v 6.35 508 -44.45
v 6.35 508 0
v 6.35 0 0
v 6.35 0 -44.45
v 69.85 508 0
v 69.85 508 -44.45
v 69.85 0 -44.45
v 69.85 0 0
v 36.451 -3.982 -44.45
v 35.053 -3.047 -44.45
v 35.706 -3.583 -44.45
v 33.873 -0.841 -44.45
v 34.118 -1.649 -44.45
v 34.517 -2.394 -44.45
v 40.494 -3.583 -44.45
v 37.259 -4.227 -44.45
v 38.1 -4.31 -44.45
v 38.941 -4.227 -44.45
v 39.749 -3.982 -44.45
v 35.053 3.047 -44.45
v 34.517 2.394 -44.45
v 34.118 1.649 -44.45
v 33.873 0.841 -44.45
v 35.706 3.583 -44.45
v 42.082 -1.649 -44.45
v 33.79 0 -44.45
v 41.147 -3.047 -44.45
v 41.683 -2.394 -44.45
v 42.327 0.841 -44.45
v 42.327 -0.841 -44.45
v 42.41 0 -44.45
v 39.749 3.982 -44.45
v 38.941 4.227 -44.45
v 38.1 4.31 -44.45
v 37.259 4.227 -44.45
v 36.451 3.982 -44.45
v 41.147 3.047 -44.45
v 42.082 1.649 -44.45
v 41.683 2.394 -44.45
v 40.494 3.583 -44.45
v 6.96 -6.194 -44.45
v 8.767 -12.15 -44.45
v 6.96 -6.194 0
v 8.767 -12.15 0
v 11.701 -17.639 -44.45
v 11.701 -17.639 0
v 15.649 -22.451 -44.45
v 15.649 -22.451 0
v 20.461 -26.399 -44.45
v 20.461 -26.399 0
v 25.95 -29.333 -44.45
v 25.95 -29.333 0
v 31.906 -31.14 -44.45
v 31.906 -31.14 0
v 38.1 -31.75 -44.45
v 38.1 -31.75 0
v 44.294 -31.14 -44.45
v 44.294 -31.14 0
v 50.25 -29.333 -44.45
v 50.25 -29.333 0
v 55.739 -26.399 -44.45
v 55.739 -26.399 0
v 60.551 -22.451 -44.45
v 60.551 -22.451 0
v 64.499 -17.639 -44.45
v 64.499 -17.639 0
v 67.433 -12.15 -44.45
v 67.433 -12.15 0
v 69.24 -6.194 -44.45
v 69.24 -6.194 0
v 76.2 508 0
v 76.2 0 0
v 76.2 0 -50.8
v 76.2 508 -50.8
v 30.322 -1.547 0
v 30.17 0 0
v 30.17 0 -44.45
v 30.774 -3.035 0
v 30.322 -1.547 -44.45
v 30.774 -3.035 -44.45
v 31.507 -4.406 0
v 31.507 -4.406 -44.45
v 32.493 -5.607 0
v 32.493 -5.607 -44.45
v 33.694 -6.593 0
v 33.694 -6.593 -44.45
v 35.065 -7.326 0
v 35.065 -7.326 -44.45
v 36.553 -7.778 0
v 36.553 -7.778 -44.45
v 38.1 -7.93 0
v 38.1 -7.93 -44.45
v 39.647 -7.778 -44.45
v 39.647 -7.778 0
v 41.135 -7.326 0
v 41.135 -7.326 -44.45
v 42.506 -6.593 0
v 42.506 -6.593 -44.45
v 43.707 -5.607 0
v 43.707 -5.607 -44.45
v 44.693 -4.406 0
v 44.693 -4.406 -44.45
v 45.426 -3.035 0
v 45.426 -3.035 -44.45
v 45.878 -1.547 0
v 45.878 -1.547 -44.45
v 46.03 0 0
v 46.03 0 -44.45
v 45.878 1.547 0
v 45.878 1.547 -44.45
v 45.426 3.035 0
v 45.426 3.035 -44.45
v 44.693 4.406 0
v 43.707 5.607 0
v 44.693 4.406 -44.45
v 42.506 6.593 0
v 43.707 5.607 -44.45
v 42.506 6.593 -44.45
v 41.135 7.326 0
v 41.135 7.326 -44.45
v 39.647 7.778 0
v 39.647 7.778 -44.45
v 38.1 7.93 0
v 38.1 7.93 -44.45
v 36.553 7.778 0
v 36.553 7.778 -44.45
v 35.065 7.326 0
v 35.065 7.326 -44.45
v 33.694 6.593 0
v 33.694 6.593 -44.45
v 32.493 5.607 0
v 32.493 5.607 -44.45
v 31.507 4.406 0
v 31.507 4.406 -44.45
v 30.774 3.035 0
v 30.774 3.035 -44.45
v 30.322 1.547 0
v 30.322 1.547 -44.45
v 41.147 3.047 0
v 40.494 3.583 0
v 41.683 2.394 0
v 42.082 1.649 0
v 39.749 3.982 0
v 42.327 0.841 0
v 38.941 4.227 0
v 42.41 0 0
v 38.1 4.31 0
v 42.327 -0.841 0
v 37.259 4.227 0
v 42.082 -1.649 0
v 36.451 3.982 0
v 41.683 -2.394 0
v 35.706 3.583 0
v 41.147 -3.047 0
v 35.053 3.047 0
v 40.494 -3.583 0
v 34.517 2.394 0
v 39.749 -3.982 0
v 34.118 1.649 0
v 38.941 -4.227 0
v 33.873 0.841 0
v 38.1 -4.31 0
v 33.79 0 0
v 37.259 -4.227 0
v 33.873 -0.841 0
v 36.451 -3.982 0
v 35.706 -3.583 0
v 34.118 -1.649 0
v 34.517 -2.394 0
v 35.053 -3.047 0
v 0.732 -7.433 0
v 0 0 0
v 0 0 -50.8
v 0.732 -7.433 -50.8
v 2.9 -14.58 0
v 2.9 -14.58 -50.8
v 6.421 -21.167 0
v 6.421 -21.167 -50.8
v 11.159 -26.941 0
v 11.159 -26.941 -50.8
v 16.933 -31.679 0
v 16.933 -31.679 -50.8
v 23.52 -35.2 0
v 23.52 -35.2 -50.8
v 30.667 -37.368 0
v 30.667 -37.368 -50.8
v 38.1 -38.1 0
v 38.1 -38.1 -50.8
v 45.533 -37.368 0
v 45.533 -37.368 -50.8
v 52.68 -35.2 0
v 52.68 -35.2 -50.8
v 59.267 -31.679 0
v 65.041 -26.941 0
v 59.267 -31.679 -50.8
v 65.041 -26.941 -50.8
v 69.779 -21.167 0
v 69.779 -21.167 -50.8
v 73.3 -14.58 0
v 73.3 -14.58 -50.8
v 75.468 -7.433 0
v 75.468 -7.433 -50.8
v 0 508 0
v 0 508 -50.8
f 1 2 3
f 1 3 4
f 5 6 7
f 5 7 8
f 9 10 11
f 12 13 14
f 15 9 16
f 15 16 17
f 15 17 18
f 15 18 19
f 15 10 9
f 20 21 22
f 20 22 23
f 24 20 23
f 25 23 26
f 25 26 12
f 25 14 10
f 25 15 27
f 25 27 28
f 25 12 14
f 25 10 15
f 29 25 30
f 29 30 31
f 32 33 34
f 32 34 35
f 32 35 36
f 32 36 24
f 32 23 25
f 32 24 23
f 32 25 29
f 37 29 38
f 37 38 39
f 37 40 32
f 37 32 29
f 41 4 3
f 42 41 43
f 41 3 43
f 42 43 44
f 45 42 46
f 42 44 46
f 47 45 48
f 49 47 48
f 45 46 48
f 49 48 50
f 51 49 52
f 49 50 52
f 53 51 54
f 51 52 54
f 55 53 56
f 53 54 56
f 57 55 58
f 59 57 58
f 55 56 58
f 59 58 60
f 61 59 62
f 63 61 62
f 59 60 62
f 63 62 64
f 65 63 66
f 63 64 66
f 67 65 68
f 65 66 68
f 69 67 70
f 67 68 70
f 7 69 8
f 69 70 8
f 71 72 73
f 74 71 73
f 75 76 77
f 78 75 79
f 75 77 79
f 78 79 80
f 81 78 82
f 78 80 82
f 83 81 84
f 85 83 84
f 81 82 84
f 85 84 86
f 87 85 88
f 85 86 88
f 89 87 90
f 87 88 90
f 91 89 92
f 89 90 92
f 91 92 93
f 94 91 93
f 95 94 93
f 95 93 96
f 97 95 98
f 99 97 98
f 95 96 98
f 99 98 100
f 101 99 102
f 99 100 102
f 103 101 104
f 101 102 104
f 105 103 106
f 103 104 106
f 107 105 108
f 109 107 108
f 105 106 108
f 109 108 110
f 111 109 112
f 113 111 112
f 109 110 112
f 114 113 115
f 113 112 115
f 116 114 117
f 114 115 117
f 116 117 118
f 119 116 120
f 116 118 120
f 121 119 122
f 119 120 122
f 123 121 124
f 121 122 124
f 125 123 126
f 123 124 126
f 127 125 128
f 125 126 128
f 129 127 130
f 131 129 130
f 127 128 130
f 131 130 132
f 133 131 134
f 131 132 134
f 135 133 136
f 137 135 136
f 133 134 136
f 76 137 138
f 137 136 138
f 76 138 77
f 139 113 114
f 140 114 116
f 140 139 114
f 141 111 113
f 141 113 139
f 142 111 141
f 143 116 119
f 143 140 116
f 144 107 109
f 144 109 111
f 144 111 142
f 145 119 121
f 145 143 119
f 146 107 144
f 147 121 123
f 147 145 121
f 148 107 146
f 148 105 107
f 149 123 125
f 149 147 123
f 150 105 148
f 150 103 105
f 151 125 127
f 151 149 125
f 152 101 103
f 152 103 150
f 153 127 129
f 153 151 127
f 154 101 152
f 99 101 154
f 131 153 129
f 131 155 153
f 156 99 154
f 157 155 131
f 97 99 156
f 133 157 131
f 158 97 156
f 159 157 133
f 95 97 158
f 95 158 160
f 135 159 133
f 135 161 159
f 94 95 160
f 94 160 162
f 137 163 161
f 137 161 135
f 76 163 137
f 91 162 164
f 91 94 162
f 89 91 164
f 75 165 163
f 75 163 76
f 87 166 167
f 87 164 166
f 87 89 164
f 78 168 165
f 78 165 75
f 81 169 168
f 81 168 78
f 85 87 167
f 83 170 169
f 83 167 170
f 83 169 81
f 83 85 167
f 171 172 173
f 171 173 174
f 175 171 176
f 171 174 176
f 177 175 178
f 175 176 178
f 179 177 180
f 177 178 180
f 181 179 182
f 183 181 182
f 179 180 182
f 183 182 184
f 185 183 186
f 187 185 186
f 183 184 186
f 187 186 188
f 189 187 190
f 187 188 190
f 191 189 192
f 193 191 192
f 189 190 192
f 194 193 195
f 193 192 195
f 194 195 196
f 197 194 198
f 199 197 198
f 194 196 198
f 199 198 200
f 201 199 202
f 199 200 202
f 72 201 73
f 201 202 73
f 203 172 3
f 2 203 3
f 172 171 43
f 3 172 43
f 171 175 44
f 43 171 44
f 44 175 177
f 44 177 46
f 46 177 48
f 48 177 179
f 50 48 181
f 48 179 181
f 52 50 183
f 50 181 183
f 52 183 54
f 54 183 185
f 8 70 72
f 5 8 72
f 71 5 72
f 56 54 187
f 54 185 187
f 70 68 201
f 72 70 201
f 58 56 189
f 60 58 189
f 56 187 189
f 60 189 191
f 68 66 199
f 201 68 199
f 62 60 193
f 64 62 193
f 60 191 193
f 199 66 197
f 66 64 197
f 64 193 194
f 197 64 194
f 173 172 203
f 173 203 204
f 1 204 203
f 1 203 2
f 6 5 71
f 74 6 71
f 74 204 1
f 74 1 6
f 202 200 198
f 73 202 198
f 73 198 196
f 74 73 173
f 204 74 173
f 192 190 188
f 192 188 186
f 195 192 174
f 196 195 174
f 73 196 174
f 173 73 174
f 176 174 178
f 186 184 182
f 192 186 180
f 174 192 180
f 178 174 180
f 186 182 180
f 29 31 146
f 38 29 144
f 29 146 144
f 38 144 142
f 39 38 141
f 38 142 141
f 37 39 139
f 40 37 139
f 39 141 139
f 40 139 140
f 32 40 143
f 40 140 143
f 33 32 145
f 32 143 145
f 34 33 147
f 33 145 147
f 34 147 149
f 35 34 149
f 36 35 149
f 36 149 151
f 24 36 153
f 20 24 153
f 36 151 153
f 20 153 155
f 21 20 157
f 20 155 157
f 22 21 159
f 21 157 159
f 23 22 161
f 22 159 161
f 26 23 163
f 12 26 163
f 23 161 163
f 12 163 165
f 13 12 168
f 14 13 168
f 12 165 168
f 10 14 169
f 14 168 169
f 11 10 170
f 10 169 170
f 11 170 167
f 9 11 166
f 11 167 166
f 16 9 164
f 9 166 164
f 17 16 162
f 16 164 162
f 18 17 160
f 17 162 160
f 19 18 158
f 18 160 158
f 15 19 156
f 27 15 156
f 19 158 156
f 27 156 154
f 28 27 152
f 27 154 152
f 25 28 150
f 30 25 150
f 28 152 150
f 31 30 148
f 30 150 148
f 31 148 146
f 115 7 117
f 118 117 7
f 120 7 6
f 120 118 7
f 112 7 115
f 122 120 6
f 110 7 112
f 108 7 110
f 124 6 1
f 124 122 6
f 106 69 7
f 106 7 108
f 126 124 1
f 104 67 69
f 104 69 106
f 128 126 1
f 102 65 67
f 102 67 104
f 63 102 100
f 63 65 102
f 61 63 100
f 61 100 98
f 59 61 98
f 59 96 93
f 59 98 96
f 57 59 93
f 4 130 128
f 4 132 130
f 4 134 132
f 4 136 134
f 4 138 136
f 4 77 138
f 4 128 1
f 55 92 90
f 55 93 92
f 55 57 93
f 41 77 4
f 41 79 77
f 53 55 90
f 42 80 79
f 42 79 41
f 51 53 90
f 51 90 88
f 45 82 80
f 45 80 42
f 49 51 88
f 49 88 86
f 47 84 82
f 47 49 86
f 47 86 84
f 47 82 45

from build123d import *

# Parameters (mm, degrees)
SKETCH1_W           = 6.35
SKETCH1_H           = 50.8
SKETCH1_W_2         = 63.5
SKETCH1_H_2         = 6.35
BOSS_EXTRUDE1_DEPTH = 508
SKETCH2_W           = 31.75
SKETCH2_H           = 6.35
REVOLVE2_ANGLE      = 180
SKETCH3_R           = 7.929881475
BOSS_EXTRUDE2_DEPTH = 44.45
SKETCH4_R           = 4.30972172
CUT_EXTRUDE1_DEPTH  = 44.45


with BuildPart() as part:
    # Sketch1 → Boss-Extrude1 (new body)
    with BuildSketch(Plane(origin=(0, 0, 0), x_dir=(1, 0, 0), z_dir=(0, 1, 0))):
        with Locations((3.175, 25.4)):
            Rectangle(SKETCH1_W, SKETCH1_H)
        with Locations((38.1, 47.625)):
            Rectangle(SKETCH1_W_2, SKETCH1_H_2)
        Polygon((69.85, 50.8), (69.85, 44.45), (69.85, 0), (76.2, 0), (76.2, 50.8), align=None)
    extrude(amount=BOSS_EXTRUDE1_DEPTH)

    # Sketch2 → Revolve2 (revolve)
    with BuildSketch(Plane.XZ):
        with Locations((22.225, -47.625)):
            Rectangle(SKETCH2_W, SKETCH2_H)
        Polygon((6.35, 0), (0, 0), (0, -50.8), (6.35, -50.8), (6.35, -44.45), align=None)
    revolve(axis=Axis((38.1, 0, -50.8), (0, 0, 1)), revolution_arc=REVOLVE2_ANGLE)

    # Sketch3 → Boss-Extrude2 (add)
    with BuildSketch(Plane.XY.offset(-44.45)):
        with Locations(Location((38.1, 0, 0), (0, 0, 180))):
            Circle(SKETCH3_R)
    extrude(amount=BOSS_EXTRUDE2_DEPTH)

    # Sketch4 → Cut-Extrude1 (cut)
    with BuildSketch(Plane.XY):
        with Locations((38.1, 0)):
            Circle(SKETCH4_R)
    extrude(amount=-CUT_EXTRUDE1_DEPTH, mode=Mode.SUBTRACT)


solid = part.part
